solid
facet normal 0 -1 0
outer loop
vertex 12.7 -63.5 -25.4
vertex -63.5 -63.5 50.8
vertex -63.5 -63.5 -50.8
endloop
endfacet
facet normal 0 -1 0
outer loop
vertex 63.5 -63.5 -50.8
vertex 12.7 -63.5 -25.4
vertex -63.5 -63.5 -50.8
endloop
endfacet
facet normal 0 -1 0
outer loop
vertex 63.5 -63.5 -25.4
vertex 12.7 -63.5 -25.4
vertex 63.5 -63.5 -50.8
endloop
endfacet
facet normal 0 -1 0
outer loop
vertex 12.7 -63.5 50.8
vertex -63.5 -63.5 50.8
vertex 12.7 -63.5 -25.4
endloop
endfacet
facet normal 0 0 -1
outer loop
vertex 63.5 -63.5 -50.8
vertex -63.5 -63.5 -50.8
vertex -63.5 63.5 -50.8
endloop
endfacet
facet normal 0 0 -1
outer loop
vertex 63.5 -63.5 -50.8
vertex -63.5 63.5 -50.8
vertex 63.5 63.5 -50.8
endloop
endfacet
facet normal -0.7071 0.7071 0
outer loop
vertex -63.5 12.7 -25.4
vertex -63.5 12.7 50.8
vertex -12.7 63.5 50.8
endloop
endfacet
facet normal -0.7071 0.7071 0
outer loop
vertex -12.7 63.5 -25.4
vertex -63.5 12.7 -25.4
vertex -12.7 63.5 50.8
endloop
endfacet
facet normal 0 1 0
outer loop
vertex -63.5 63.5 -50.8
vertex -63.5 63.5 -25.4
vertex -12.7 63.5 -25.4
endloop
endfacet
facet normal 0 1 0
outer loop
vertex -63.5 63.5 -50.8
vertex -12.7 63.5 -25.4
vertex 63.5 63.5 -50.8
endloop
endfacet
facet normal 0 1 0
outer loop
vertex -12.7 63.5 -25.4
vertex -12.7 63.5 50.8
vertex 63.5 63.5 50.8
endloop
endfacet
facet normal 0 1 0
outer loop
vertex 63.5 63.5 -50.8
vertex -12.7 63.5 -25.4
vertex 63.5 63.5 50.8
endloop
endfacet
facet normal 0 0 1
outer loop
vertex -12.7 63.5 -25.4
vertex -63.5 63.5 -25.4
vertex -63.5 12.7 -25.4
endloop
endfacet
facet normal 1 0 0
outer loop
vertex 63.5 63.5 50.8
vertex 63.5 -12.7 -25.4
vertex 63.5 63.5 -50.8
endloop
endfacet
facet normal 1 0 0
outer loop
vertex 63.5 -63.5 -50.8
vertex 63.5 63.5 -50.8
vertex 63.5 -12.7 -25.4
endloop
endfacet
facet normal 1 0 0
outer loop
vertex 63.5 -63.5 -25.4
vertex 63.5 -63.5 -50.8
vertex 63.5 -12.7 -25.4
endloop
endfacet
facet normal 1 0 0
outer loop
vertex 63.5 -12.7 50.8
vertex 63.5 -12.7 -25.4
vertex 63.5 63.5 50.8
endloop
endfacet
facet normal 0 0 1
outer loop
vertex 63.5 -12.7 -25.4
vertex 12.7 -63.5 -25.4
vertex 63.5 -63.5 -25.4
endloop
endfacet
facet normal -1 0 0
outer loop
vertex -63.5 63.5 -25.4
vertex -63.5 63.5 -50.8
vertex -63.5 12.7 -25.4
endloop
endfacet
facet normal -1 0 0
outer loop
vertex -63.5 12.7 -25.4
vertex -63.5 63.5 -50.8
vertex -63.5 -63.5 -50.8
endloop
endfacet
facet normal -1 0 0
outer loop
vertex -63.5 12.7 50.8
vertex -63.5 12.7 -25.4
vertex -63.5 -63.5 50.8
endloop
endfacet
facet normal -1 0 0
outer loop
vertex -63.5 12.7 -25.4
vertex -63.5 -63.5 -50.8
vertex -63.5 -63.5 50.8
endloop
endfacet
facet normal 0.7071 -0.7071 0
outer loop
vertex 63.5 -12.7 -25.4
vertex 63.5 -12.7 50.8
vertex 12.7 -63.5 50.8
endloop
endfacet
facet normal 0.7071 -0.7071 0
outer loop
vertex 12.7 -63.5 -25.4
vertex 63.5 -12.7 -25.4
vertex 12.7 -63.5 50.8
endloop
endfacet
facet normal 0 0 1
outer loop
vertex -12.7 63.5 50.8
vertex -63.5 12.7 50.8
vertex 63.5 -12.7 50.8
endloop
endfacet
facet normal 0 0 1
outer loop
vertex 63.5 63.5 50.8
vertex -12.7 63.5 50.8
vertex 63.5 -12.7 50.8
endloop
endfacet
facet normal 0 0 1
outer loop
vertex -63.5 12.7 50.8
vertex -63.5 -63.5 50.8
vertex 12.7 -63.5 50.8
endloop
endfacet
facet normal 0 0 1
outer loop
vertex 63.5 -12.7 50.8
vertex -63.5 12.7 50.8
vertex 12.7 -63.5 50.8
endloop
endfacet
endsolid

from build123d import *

# Parameters (mm, degrees)
F0_W     = 127
F0_H     = 101.6
F1_DEPTH = 63.5
F3_DEPTH = 76.2
F4_DEPTH = 76.2


with BuildPart() as f1:
    # F0 (on Front) → F1 (new body, symmetric)
    with BuildSketch(Plane.XZ):
        Rectangle(F0_W, F0_H)
    extrude(amount=F1_DEPTH, both=True)

    # F2 (on face) → F3 (cut)
    with BuildSketch(Plane.XY.offset(50.8)):
        Polygon((-12.7, 63.5), (-63.5, 63.5), (-63.5, 12.7), align=None)
    extrude(amount=-F3_DEPTH, mode=Mode.SUBTRACT)

    # F2 (on face) → F4 (cut)
    with BuildSketch(Plane.XY.offset(50.8)):
        Polygon((63.5, -63.5), (63.5, -12.7), (12.7, -63.5), align=None)
    extrude(amount=-F4_DEPTH, mode=Mode.SUBTRACT)


solid = f1.part
